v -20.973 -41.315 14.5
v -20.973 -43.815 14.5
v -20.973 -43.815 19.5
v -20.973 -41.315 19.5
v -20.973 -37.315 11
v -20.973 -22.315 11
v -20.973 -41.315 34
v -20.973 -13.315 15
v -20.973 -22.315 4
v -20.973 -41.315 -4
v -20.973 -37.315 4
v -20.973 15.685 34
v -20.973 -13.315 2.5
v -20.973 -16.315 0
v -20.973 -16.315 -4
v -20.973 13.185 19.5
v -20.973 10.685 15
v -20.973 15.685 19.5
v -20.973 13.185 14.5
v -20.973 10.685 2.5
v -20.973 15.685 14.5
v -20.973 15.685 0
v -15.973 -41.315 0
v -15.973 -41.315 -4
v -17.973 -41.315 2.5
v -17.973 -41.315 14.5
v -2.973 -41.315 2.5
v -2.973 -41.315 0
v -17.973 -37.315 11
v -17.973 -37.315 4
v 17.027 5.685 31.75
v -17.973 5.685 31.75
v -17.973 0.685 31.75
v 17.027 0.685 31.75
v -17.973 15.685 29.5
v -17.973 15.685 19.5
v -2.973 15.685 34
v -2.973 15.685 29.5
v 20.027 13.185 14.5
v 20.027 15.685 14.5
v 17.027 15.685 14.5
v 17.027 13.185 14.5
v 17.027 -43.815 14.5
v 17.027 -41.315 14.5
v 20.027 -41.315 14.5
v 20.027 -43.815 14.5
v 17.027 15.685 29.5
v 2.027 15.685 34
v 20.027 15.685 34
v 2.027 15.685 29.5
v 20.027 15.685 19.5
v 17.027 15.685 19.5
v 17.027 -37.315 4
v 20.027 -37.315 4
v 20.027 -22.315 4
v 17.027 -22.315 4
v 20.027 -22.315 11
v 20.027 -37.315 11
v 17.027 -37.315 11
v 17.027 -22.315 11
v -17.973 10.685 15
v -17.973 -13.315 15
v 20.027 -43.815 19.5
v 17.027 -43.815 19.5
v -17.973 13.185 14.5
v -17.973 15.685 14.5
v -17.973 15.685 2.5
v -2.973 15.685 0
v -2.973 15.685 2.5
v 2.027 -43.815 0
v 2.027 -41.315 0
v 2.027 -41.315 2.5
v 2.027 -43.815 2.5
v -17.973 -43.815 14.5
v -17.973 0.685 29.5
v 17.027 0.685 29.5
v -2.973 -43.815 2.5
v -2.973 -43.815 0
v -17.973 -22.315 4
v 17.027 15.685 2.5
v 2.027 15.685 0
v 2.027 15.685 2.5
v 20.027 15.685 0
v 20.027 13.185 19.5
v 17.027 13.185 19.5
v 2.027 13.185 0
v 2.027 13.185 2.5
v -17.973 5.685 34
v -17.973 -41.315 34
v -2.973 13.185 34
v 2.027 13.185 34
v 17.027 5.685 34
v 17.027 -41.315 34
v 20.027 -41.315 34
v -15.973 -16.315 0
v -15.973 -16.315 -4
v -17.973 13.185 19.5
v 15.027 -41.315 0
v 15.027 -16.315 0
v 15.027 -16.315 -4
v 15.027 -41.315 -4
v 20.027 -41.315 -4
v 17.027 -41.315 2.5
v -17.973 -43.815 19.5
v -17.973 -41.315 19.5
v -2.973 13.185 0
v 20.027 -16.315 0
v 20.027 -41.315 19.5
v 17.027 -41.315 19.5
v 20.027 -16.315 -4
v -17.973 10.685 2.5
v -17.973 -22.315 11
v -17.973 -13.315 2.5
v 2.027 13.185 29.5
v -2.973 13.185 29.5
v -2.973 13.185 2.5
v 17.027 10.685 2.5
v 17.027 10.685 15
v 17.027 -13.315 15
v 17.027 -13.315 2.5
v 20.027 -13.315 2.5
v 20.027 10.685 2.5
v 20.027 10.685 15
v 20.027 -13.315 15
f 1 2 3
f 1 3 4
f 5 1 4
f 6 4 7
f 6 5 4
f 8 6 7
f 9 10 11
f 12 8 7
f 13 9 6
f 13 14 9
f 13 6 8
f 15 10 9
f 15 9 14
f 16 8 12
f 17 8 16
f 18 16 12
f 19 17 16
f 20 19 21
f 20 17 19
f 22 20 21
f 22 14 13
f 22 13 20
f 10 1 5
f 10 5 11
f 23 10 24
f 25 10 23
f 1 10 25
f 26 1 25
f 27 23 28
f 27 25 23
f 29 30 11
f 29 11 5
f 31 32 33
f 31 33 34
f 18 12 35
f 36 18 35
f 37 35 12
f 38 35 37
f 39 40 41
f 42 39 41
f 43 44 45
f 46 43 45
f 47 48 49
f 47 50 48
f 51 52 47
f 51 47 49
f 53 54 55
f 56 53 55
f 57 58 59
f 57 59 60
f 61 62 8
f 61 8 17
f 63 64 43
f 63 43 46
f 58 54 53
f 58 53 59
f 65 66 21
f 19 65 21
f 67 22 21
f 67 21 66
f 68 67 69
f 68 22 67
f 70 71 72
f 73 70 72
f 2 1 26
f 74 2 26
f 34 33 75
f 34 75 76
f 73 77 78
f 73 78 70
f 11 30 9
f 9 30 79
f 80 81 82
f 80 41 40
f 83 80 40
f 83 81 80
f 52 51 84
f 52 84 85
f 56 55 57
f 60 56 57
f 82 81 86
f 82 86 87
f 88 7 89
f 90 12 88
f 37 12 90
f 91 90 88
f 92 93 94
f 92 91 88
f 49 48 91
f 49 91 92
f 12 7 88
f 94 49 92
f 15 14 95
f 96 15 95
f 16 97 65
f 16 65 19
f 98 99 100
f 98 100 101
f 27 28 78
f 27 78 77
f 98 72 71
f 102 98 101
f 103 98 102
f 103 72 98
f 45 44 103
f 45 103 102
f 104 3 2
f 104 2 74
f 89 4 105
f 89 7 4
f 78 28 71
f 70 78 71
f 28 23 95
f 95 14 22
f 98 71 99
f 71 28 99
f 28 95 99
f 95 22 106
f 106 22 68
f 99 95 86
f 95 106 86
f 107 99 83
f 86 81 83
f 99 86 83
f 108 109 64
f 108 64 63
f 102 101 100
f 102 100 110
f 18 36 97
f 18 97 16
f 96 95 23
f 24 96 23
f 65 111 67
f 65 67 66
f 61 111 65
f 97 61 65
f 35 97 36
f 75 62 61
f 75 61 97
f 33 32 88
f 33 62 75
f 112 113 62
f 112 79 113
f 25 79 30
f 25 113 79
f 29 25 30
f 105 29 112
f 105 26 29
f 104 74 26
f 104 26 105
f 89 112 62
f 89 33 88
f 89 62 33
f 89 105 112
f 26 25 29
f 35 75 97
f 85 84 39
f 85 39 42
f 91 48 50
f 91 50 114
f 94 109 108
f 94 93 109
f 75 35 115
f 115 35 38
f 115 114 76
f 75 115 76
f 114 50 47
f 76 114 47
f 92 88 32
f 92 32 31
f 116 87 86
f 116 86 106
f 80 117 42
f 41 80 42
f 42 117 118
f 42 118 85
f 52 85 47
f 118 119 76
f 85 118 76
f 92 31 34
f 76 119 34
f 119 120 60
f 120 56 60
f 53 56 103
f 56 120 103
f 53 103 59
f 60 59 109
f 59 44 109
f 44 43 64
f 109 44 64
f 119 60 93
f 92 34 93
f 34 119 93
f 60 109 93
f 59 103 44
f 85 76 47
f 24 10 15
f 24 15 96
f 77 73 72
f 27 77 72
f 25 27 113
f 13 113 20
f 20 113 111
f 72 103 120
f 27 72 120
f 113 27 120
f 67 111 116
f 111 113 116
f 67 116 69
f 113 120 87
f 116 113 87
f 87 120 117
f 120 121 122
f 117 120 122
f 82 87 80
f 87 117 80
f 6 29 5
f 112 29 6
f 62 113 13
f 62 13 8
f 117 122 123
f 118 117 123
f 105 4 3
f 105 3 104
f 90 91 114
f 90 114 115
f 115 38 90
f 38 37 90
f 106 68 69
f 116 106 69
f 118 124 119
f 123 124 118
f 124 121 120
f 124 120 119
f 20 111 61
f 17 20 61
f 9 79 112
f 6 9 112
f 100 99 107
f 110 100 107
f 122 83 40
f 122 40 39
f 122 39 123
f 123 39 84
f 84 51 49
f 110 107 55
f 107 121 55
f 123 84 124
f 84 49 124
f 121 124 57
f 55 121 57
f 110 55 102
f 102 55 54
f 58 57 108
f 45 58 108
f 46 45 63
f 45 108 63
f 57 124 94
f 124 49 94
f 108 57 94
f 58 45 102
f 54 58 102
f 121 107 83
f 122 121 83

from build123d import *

# Parameters (mm, degrees)
F0_W      = 41
F0_H      = 57
F1_DEPTH  = 34
F2_W      = 35
F2_H      = 29
F3_DEPTH  = 57
F4_W      = 3
F4_H      = 5
F4_W_2    = 5
F4_H_2    = 2.5
F5_DEPTH  = 2.5
F6_W      = 35
F6_H      = 2.5
F7_DEPTH  = 47
F8_W      = 24
F8_H      = 12.5
F9_DEPTH  = 41.001
F10_W     = 5
F10_H     = 25
F11_DEPTH = 4
F12_W     = 15
F12_H     = 7
F13_DEPTH = 41.001
F14_DEPTH = 2
F15_W     = 35
F15_H     = 2.25
F16_DEPTH = 5
F17_W     = 3
F17_H     = 5
F17_W_2   = 5
F17_H_2   = 2.5
F18_DEPTH = 2.5


with BuildPart() as f1:
    # F0 (on Top) → F1 (new body)
    with BuildSketch(Plane.XY):
        with Locations((-0.472872518, -12.8149892955)):
            Rectangle(F0_W, F0_H)
    extrude(amount=F1_DEPTH)

    # F2 (on face) → F3 (cut, through all)
    with BuildSketch(Plane.XZ.offset(41.3149892955)):
        with Locations((-0.472872518, 17)):
            Rectangle(F2_W, F2_H)
    extrude(amount=-F3_DEPTH, mode=Mode.SUBTRACT)

    # F4 (on face) → F5 (cut)
    with BuildSketch(Plane(origin=(0, 15.6850107045, 0), x_dir=(-1, 0, 0), z_dir=(0, 1, 0))):
        with Locations((-18.527127482, 17)):
            Rectangle(F4_W, F4_H)
        with Locations((0.472872518, 32.75)):
            Rectangle(F4_W_2, F4_H_2)
        with Locations((19.472872518, 17)):
            Rectangle(F4_W, F4_H)
        with Locations((0.472872518, 1.25)):
            Rectangle(F4_W_2, F4_H_2)
    extrude(amount=-F5_DEPTH, mode=Mode.SUBTRACT)

    # F6 (on face) → F7 (cut)
    with BuildSketch(Plane.XZ.offset(41.3149892955)):
        with Locations((-0.472872518, 32.75)):
            Rectangle(F6_W, F6_H)
    extrude(amount=-F7_DEPTH, mode=Mode.SUBTRACT)

    # F8 (on face) → F9 (cut, through all)
    with BuildSketch(Plane.YZ.offset(20.027127482)):
        with Locations((-1.3149892955, 8.75)):
            Rectangle(F8_W, F8_H)
    extrude(amount=-F9_DEPTH, mode=Mode.SUBTRACT)

    # F10 (on face) → F11 (join)
    with BuildSketch(Plane(origin=(0, 0, 0), x_dir=(1, 0, 0), z_dir=(0, 0, -1))):
        with Locations((17.527127482, 28.8149892955)):
            Rectangle(F10_W, F10_H)
        with Locations((-18.472872518, 28.8149892955)):
            Rectangle(F10_W, F10_H)
    extrude(amount=F11_DEPTH)

    # F12 (on face) → F13 (cut, through all)
    with BuildSketch(Plane.YZ.offset(20.027127482)):
        with Locations((-29.8149892955, 7.5)):
            Rectangle(F12_W, F12_H)
    extrude(amount=-F13_DEPTH, mode=Mode.SUBTRACT)

    # F14 (add): a face of the model
    f14_faces = [f1.faces().sort_by_distance(p)[0] for p in [
        (-0.472872518, 10.5461218156, 31.5),
    ]]
    extrude(f14_faces, amount=F14_DEPTH)

    # F15 (on face) → F16 (join)
    with BuildSketch(Plane.XZ.offset(-5.6850107045)):
        with Locations((-0.472872518, 30.625)):
            Rectangle(F15_W, F15_H)
    extrude(amount=F16_DEPTH)

    # F17 (on face) → F18 (join)
    with BuildSketch(Plane.XZ.offset(41.3149892955)):
        with Locations((18.527127482, 17)):
            Rectangle(F17_W, F17_H)
        with Locations((-19.472872518, 17)):
            Rectangle(F17_W, F17_H)
        with Locations((-0.472872518, 1.25)):
            Rectangle(F17_W_2, F17_H_2)
    extrude(amount=F18_DEPTH)


solid = f1.part
